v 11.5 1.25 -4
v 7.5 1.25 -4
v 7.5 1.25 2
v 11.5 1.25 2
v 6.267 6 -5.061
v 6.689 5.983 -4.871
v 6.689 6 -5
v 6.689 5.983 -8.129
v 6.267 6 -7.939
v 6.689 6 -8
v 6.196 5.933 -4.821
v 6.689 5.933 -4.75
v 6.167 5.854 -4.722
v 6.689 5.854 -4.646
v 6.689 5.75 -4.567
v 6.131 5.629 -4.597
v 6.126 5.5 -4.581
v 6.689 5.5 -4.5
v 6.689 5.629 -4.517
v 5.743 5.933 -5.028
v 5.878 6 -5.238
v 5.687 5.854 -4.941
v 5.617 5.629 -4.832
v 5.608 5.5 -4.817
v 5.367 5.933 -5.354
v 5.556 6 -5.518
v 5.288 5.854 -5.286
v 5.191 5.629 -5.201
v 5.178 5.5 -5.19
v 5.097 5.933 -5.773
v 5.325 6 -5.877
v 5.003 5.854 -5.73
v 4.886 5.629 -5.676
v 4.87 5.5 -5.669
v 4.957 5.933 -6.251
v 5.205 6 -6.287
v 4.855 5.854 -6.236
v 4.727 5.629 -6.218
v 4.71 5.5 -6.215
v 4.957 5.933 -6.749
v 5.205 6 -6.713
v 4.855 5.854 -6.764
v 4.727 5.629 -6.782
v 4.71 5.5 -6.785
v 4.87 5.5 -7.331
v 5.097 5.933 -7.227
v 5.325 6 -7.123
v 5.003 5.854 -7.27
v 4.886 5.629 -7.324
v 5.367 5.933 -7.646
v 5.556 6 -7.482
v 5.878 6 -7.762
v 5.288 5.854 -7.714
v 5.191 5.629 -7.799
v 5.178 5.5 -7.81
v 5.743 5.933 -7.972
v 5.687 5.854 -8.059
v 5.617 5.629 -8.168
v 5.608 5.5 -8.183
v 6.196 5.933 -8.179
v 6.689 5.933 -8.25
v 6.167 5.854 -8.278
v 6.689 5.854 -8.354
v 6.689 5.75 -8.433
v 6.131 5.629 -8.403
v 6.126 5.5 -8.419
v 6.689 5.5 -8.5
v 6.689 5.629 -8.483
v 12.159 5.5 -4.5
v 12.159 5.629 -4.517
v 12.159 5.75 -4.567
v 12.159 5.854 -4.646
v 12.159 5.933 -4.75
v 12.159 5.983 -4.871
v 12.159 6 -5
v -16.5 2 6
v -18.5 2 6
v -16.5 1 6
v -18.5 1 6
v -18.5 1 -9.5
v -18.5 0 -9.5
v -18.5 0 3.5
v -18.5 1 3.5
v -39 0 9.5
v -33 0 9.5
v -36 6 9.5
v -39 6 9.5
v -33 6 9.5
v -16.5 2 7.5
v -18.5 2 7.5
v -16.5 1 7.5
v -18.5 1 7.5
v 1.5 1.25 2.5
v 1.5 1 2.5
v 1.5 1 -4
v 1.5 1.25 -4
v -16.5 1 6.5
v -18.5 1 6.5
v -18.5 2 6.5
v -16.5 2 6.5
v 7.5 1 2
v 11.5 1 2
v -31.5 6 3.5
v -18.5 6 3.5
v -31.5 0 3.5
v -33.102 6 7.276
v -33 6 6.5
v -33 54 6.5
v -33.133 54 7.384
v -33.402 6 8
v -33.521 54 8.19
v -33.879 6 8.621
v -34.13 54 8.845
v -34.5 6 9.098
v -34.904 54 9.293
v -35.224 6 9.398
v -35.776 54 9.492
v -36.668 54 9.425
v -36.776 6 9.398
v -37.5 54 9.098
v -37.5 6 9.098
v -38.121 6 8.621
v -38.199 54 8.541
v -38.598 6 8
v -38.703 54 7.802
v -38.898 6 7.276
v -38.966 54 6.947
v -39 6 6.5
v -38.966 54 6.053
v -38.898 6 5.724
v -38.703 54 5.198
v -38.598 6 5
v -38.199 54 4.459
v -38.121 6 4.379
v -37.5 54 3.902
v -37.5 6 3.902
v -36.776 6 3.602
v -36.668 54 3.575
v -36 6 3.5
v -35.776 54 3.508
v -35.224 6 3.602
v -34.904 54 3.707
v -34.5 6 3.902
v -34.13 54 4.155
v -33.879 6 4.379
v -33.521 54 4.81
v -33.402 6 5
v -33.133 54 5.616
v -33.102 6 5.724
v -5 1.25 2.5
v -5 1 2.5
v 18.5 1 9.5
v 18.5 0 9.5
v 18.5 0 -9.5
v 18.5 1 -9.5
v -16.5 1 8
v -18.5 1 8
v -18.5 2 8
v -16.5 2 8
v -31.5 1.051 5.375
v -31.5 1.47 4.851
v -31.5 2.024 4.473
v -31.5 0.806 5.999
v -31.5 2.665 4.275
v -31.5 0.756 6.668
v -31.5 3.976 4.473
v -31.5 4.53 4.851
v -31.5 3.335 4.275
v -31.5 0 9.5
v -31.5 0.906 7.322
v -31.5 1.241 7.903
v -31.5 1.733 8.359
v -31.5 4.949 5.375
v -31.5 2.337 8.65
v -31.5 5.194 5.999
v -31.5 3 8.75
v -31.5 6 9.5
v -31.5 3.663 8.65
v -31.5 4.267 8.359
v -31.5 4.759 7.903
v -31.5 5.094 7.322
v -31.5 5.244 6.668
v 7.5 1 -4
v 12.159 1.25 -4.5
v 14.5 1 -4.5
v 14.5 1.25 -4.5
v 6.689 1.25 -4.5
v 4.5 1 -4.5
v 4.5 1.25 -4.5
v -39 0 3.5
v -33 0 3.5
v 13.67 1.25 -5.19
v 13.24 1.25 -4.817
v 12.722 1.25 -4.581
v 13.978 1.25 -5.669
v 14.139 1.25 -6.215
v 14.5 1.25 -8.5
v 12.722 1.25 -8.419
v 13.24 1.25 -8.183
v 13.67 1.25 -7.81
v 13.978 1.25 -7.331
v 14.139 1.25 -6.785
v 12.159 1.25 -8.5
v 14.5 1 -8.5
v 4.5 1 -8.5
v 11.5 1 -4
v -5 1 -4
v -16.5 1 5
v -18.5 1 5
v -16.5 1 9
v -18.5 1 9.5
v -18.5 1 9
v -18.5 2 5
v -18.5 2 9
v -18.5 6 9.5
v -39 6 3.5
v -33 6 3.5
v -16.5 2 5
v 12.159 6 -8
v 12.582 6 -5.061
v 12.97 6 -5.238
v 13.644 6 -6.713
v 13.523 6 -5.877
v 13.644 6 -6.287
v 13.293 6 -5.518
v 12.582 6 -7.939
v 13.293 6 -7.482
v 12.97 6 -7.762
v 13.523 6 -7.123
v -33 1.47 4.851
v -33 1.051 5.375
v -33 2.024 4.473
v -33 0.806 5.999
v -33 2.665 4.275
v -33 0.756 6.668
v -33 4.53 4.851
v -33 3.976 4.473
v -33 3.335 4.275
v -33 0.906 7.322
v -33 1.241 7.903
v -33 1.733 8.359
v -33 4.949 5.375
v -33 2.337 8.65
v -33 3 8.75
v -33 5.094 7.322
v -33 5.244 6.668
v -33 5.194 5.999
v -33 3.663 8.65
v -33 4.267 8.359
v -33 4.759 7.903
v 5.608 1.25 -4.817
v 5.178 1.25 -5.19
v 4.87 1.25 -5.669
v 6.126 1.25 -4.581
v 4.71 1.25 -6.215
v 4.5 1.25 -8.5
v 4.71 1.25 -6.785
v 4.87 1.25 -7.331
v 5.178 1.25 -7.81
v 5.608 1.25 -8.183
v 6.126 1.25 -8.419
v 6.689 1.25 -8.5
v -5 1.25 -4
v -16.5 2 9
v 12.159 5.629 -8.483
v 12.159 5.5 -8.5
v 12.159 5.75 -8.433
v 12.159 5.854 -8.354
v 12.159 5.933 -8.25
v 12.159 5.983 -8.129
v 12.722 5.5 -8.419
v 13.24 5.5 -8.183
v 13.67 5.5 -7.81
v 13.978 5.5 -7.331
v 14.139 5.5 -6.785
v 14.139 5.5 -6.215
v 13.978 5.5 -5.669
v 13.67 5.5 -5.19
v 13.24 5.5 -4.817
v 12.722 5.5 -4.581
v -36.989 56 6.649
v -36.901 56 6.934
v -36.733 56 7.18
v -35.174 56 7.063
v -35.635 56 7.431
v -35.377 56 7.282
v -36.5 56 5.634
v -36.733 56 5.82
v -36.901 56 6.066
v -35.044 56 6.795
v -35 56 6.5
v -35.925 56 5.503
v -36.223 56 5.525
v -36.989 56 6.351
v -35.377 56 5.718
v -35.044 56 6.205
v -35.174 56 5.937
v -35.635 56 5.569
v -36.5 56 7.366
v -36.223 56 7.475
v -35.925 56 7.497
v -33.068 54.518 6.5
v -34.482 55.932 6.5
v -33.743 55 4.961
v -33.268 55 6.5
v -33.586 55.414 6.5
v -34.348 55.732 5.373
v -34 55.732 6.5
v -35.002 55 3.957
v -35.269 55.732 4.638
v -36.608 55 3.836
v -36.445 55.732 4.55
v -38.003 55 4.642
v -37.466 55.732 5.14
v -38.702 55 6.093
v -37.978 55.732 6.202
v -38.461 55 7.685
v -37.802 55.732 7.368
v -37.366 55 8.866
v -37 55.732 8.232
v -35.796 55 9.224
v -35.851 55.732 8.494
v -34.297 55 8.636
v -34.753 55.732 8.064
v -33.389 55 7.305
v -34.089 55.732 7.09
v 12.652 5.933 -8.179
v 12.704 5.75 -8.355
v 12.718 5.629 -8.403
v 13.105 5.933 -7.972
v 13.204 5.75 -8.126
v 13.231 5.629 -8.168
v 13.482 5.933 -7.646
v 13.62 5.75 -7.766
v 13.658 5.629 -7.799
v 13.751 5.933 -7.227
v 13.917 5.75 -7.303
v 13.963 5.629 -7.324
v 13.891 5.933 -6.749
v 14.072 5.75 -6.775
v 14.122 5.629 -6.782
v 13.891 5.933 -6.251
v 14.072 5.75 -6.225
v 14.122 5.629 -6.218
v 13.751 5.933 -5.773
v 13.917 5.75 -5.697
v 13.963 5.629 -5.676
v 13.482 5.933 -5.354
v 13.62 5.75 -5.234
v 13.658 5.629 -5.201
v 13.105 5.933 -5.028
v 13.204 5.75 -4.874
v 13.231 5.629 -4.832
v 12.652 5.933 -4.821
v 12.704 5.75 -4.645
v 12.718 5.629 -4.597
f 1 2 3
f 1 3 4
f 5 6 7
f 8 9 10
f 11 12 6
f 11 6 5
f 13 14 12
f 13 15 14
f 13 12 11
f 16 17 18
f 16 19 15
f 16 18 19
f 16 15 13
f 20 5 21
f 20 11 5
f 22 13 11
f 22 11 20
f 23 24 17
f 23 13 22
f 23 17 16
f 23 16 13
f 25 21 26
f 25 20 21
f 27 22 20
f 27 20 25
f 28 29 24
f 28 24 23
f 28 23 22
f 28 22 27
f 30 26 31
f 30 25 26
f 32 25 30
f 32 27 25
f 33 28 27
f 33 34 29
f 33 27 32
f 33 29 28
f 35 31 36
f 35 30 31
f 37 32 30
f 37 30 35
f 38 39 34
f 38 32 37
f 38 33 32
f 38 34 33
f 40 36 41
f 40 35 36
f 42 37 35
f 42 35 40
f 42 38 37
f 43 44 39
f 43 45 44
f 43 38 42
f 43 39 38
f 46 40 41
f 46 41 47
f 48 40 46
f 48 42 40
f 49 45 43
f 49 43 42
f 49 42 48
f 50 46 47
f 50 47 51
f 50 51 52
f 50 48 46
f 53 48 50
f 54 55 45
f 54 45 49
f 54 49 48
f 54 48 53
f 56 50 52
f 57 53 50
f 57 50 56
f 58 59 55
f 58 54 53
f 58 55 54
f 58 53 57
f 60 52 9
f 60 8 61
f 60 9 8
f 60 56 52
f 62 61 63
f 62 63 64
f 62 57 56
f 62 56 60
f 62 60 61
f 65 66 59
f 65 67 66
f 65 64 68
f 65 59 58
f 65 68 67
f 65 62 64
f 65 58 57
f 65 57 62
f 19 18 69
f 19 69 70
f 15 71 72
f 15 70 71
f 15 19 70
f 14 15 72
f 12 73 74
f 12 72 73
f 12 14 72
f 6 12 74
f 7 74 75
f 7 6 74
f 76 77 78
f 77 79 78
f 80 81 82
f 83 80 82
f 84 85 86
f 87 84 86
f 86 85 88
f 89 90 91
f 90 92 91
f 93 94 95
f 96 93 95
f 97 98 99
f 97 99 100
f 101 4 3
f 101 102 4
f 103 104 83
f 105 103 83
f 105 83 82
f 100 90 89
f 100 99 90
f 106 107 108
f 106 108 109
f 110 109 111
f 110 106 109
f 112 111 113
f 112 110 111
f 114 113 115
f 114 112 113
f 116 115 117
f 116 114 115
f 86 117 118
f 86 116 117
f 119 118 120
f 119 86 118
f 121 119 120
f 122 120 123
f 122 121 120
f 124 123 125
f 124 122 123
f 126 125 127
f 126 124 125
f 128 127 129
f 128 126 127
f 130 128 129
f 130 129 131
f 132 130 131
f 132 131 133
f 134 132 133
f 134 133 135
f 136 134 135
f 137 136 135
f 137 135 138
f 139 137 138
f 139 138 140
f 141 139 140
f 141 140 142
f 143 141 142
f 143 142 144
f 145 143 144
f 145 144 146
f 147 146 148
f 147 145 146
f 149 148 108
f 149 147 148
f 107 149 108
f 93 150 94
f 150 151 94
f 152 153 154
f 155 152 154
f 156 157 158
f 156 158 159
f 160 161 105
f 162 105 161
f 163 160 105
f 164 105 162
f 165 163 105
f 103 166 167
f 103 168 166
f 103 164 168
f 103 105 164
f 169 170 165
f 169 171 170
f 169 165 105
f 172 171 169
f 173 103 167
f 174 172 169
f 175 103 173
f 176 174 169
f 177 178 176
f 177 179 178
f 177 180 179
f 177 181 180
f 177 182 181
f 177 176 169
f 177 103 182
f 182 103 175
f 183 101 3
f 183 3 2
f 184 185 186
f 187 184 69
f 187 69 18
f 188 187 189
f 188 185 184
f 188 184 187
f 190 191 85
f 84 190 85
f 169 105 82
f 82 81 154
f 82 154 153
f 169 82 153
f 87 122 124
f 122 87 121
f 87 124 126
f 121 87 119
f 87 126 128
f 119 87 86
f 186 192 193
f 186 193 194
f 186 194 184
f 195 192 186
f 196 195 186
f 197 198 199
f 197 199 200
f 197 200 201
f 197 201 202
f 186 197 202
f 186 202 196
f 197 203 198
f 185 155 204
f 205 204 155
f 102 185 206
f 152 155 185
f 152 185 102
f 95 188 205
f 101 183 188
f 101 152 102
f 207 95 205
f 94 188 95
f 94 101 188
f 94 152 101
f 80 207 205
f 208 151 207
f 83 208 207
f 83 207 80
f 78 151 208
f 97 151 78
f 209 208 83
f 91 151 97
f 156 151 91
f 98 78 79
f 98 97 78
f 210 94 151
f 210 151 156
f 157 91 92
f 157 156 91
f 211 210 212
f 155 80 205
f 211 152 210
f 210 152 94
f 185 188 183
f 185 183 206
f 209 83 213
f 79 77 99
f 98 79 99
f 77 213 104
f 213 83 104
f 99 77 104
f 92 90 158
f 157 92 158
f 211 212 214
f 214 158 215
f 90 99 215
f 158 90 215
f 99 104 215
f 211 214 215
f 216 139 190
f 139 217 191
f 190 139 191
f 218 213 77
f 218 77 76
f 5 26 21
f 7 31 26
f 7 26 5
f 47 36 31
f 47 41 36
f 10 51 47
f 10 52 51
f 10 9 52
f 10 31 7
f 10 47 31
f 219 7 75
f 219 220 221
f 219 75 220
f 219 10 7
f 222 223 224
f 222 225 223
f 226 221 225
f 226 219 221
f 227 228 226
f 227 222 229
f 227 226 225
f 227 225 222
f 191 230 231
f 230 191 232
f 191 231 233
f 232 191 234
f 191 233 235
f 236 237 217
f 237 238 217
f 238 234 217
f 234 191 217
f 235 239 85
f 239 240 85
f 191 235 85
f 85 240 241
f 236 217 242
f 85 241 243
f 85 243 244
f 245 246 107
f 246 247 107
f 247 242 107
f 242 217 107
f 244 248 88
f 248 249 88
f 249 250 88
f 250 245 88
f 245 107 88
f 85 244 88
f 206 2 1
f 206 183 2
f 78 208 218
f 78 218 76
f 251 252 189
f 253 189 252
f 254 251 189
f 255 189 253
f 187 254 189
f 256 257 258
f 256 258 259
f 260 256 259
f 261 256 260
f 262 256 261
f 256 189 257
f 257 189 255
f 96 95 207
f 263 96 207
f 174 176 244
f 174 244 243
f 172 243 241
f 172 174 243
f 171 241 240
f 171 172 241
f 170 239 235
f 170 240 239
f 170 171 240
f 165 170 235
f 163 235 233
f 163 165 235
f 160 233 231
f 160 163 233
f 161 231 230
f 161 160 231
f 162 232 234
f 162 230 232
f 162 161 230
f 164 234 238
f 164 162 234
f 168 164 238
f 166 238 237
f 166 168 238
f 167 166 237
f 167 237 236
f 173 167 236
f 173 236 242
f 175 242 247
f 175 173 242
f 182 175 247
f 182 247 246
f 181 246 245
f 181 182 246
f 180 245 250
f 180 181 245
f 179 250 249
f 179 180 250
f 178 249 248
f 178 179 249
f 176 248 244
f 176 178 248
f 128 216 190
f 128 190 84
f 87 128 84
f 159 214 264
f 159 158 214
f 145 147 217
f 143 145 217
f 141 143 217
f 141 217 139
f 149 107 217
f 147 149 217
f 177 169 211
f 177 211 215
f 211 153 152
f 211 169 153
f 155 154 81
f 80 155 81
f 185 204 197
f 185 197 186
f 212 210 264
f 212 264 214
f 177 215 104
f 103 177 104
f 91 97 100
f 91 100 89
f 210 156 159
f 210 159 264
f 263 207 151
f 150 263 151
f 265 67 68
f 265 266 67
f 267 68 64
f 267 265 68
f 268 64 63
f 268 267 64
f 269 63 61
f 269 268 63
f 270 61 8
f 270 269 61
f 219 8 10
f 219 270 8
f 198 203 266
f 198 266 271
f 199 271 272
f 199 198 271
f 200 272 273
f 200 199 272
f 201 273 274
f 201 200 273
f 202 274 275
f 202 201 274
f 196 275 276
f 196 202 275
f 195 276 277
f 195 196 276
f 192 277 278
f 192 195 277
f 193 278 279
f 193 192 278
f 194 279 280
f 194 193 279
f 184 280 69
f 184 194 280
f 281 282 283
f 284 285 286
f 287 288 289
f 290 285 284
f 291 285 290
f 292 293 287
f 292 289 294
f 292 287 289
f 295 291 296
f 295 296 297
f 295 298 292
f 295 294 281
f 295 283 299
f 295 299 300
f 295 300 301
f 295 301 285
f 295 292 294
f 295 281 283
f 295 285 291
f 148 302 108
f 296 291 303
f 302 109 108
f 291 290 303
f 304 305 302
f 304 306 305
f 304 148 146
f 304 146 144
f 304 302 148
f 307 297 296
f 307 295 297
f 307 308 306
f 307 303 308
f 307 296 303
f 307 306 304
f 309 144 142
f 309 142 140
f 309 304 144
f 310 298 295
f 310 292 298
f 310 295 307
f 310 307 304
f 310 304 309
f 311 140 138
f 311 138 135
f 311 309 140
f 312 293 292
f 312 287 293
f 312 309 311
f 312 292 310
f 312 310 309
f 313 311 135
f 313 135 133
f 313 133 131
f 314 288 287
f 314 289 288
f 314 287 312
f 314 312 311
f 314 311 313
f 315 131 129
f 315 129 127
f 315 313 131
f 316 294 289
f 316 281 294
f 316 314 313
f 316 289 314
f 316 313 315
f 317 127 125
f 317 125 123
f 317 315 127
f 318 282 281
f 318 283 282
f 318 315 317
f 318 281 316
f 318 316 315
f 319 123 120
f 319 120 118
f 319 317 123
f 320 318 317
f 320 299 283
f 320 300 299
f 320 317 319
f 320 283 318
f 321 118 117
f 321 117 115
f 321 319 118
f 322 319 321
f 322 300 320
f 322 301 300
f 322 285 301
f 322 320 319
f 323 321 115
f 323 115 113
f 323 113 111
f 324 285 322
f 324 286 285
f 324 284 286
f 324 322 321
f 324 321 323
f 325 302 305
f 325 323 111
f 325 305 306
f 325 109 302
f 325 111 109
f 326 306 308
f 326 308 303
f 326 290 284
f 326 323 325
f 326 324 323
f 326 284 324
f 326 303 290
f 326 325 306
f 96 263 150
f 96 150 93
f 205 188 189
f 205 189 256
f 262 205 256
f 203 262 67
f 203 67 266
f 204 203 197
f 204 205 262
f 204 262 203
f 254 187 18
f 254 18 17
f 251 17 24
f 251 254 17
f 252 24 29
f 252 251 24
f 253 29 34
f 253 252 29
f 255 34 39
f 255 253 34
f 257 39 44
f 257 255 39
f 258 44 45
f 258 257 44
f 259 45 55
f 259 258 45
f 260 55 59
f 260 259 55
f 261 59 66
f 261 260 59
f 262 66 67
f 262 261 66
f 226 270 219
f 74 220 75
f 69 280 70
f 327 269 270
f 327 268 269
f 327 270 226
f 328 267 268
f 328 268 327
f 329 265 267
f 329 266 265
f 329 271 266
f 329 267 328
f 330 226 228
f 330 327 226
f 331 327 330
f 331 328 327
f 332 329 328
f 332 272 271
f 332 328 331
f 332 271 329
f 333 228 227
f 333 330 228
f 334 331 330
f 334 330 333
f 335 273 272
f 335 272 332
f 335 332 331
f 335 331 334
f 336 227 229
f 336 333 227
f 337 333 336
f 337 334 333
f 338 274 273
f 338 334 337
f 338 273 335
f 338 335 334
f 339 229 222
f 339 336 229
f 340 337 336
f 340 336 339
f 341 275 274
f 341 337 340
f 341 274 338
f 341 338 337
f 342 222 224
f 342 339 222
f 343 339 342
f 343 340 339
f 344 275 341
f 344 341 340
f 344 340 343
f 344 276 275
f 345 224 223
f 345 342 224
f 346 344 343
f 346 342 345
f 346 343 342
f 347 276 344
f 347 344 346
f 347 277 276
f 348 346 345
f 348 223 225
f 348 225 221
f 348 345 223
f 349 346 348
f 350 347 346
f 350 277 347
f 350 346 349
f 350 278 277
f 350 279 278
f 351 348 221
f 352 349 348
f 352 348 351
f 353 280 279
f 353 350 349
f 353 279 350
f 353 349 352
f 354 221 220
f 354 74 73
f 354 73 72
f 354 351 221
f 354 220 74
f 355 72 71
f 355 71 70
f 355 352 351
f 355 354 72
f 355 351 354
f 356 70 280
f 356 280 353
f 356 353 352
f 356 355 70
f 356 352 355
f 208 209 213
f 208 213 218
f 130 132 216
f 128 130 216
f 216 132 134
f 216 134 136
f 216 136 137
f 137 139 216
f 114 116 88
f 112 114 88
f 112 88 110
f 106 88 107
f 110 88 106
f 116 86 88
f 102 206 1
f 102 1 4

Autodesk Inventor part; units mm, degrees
ref_plane "YZ Plane" through (0, 0, 0) normal (1, 0, 0) x (0, 1, 0)
ref_plane "XZ Plane" through (0, 0, 0) normal (0, 1, 0) x (-1, 0, 0)
ref_plane "XY Plane" through (0, 0, 0) normal (0, 0, 1) x (1, 0, 0)
sketch "Sketch1" plane through (0, 0, 0) normal (0, 1, 0) x (-1, 0, 0)
  line L0 (-18.5, 9.5) -> (-18.5, -9.5)
  line L1 (-18.5, -9.5) -> (18.5, -9.5)
  line L2 (18.5, -9.5) -> (18.5, 9.5)
  line L3 (18.5, 9.5) -> (-18.5, 9.5)
  line L4 (-18.5, 9.5) -> (18.5, -9.5) construction
  line L5 (-18.5, -9.5) -> (18.5, 9.5) construction
  point P0 (0, 0)
  dimension "d0" = 19
  dimension "d1" = 37
extrude "Extrusion1" add sketch "Sketch1" along normal blind 1
sketch "Sketch2" plane through (0, 1, 0) normal (0, 1, 0) x (1, 0, 0)
  line L0 (-18.5, 9.5) -> (-18.5, -9.5) construction
  line L1 (18.5, 9.5) -> (-18.5, 9.5) construction
  line L2 (-18.5, -9.5) -> (18.5, 9.5) construction
  line L3 (18.5, -9.5) -> (18.5, 9.5) construction
  line L4 (-18.5, 9.5) -> (18.5, -9.5) construction
  line L5 (-18.5, 0) -> (18.5, 0) construction
  line L6 (0, -9.5) -> (0, 9.5) construction
  line L7 (18.5, 9.5) -> (14.5, 9.5) construction
  line L8 (14.5, 9.5) -> (14.5, 8.5) construction
  line L9 (14.5, 8.5) -> (14.5, 4.5)
  line L10 (14.5, 4.5) -> (4.5, 4.5)
  line L11 (4.5, 4.5) -> (4.5, 8.5)
  line L12 (4.5, 8.5) -> (14.5, 8.5)
  line L13 (4.5, 4.5) -> (14.5, 8.5) construction
  line L14 (4.5, 8.5) -> (14.5, 4.5) construction
  line L15 (6.6893, 4.5) -> (6.6893, 8.5) construction
  line L16 (6.6893, 5.3757) -> (14.5, 5.3757) construction
  line L17 (12.159, 4.5) -> (12.159, 8.5) construction
  line L18 (6.6893, 6.5) -> (12.159, 6.5) construction
  line L19 (6.6893, 8.5) -> (12.159, 8.5)
  line L20 (12.159, 4.5) -> (6.6893, 4.5)
  arc A0 (6.6893, 8.5) -> (6.6893, 4.5) centre (6.6893, 6.5) ccw
  arc A1 (12.159, 4.5) -> (12.159, 8.5) centre (12.159, 6.5) ccw
  line L21 (18.5, 4.5) -> (11.5, 4.5) construction
  line L22 (11.5, 4.5) -> (11.5, 4) construction
  line L23 (11.5, 4) -> (11.5, -2)
  line L24 (11.5, -2) -> (7.5, -2)
  line L25 (7.5, -2) -> (7.5, 4)
  line L26 (7.5, 4) -> (11.5, 4)
  line L27 (7.5, 4) -> (1.5, 4) construction
  line L28 (1.5, 4) -> (-5, 4)
  line L29 (-5, 4) -> (-5, -2.5)
  line L30 (-5, -2.5) -> (1.5, -2.5)
  line L31 (1.5, -2.5) -> (1.5, 4)
  line L32 (-18.5, -9.5) -> (-18.5, -9)
  line L33 (-18.5, -9) -> (-18.5, -8)
  line L34 (-18.5, -8) -> (-18.5, -7.5)
  line L35 (-18.5, -7.5) -> (-18.5, -6.5)
  line L36 (-18.5, -6.5) -> (-18.5, -6)
  line L37 (-18.5, -6) -> (-18.5, -5)
  line L38 (-18.5, -5) -> (-16.5, -5)
  line L39 (-16.5, -5) -> (-16.5, -9)
  line L40 (-16.5, -9) -> (-18.5, -9)
  line L41 (-18.5, -8) -> (-16.5, -8)
  line L42 (-18.5, -7.5) -> (-16.5, -7.5)
  line L43 (-18.5, -6.5) -> (-16.5, -6.5)
  line L44 (-18.5, -6) -> (-16.5, -6)
  point P0 (0, 0)
  point P1 (9.4242, 6.5)
  dimension "d4" = 4
  dimension "d5" = 1
  dimension "d6" = 4
  dimension "d7" = 10
  dimension "d8" = 7
  dimension "d9" = 0.5
  dimension "d10" = 6
  dimension "d11" = 4
  dimension "d12" = 6
  dimension "d13" = 6.5
  dimension "d14" = 6.5
  dimension "d15" = 0.5
  dimension "d16" = 1
  dimension "d17" = 0.5
  dimension "d18" = 1
  dimension "d19" = 0.5
  dimension "d20" = 1
  dimension "d21" = 2
extrude "Extrusion2" add sketch "Sketch2" along normal blind 0.25 contours L9 L10 A1 L12 | A1 L10 A0 L12 | A0 L10 L11 L12 | L23 L24 L25 L26 | L31 L30 L29 L28
extrude "Extrusion3" add sketch "Sketch2" along normal blind 1 contours L33 L41 L39 L40 | L35 L43 L39 L42 | L37 L38 L39 L44
sketch "Sketch3" plane through (-18.5, 0, -9.5) normal (-1, 0, 0) x (0, 0, 1)
  line L0 (19, 0) -> (19, 1) projected
  line L1 (19, 0) -> (19, 6)
  line L2 (19, 6) -> (13, 6)
  line L3 (13, 6) -> (13, 0)
  line L4 (0, 0) -> (19, 0) projected
  point P0 (9.5, 0)
  dimension "d26" = 6
  dimension "d27" = 6
extrude "Extrusion4" add sketch "Sketch3" along normal blind 13
sketch "Sketch4" plane through (-31.5, 0, -9.5) normal (-1, 0, 0) x (0, 0, 1)
  line L0 (13, 6) -> (13, 1) construction
  line L1 (19, 0) -> (19, 1) construction
  line L2 (13, 6) -> (19, 0) construction
  line L3 (19, 0) -> (19, 6) construction
  line L4 (19, 6) -> (13, 0) construction
  circle A0 centre (16, 3) radius 2.25
  point P0 (9.5, 0)
  dimension "d30" = 4.5
extrude "Extrusion5" add sketch "Sketch4" along normal blind 1.5
sketch "Sketch5" plane through (-33, 3, 6.5) normal (-1, 0, 0) x (0, 0, 1)
  line L0 (3, -3) -> (3, 3)
  line L1 (3, 3) -> (-3, 3)
  line L2 (-3, 3) -> (-3, -3)
  line L3 (-3, -3) -> (3, -3)
  line L4 (3, -3) -> (-3, 3) construction
  line L5 (3, 3) -> (-3, -3) construction
  point P0 (-6.5, -3)
  point P1 (0, 0)
  dimension "d33" = 6
  dimension "d34" = 6
extrude "Extrusion6" add sketch "Sketch5" along normal blind 6
sketch "Sketch6" plane through (-33, 6, 9.5) normal (0, 1, 0) x (1, 0, 0)
  line L0 (-6, 0) -> (-6, 6) construction
  line L1 (-6, 6) -> (0, 0) construction
  line L2 (0, 0) -> (0, 6) construction
  line L3 (0, 6) -> (-6, 0) construction
  circle A0 centre (-3, 3) radius 3
  point P0 (33, 9.5)
extrude "Extrusion7" add sketch "Sketch6" along normal blind 50
fillet "Fillet1" radius 2 1 edges at (-39, 56, 6.5)
extrude "Extrusion8" add sketch "Sketch2" along normal blind 5 contours A1 L10 A0 L12
fillet "Fillet2" radius 0.5 4 edges at (9.4242, 6, -4.5) (14.159, 6, -6.5) (9.4242, 6, -8.5) (4.6893, 6, -6.5)
properties part number "APC 220"
